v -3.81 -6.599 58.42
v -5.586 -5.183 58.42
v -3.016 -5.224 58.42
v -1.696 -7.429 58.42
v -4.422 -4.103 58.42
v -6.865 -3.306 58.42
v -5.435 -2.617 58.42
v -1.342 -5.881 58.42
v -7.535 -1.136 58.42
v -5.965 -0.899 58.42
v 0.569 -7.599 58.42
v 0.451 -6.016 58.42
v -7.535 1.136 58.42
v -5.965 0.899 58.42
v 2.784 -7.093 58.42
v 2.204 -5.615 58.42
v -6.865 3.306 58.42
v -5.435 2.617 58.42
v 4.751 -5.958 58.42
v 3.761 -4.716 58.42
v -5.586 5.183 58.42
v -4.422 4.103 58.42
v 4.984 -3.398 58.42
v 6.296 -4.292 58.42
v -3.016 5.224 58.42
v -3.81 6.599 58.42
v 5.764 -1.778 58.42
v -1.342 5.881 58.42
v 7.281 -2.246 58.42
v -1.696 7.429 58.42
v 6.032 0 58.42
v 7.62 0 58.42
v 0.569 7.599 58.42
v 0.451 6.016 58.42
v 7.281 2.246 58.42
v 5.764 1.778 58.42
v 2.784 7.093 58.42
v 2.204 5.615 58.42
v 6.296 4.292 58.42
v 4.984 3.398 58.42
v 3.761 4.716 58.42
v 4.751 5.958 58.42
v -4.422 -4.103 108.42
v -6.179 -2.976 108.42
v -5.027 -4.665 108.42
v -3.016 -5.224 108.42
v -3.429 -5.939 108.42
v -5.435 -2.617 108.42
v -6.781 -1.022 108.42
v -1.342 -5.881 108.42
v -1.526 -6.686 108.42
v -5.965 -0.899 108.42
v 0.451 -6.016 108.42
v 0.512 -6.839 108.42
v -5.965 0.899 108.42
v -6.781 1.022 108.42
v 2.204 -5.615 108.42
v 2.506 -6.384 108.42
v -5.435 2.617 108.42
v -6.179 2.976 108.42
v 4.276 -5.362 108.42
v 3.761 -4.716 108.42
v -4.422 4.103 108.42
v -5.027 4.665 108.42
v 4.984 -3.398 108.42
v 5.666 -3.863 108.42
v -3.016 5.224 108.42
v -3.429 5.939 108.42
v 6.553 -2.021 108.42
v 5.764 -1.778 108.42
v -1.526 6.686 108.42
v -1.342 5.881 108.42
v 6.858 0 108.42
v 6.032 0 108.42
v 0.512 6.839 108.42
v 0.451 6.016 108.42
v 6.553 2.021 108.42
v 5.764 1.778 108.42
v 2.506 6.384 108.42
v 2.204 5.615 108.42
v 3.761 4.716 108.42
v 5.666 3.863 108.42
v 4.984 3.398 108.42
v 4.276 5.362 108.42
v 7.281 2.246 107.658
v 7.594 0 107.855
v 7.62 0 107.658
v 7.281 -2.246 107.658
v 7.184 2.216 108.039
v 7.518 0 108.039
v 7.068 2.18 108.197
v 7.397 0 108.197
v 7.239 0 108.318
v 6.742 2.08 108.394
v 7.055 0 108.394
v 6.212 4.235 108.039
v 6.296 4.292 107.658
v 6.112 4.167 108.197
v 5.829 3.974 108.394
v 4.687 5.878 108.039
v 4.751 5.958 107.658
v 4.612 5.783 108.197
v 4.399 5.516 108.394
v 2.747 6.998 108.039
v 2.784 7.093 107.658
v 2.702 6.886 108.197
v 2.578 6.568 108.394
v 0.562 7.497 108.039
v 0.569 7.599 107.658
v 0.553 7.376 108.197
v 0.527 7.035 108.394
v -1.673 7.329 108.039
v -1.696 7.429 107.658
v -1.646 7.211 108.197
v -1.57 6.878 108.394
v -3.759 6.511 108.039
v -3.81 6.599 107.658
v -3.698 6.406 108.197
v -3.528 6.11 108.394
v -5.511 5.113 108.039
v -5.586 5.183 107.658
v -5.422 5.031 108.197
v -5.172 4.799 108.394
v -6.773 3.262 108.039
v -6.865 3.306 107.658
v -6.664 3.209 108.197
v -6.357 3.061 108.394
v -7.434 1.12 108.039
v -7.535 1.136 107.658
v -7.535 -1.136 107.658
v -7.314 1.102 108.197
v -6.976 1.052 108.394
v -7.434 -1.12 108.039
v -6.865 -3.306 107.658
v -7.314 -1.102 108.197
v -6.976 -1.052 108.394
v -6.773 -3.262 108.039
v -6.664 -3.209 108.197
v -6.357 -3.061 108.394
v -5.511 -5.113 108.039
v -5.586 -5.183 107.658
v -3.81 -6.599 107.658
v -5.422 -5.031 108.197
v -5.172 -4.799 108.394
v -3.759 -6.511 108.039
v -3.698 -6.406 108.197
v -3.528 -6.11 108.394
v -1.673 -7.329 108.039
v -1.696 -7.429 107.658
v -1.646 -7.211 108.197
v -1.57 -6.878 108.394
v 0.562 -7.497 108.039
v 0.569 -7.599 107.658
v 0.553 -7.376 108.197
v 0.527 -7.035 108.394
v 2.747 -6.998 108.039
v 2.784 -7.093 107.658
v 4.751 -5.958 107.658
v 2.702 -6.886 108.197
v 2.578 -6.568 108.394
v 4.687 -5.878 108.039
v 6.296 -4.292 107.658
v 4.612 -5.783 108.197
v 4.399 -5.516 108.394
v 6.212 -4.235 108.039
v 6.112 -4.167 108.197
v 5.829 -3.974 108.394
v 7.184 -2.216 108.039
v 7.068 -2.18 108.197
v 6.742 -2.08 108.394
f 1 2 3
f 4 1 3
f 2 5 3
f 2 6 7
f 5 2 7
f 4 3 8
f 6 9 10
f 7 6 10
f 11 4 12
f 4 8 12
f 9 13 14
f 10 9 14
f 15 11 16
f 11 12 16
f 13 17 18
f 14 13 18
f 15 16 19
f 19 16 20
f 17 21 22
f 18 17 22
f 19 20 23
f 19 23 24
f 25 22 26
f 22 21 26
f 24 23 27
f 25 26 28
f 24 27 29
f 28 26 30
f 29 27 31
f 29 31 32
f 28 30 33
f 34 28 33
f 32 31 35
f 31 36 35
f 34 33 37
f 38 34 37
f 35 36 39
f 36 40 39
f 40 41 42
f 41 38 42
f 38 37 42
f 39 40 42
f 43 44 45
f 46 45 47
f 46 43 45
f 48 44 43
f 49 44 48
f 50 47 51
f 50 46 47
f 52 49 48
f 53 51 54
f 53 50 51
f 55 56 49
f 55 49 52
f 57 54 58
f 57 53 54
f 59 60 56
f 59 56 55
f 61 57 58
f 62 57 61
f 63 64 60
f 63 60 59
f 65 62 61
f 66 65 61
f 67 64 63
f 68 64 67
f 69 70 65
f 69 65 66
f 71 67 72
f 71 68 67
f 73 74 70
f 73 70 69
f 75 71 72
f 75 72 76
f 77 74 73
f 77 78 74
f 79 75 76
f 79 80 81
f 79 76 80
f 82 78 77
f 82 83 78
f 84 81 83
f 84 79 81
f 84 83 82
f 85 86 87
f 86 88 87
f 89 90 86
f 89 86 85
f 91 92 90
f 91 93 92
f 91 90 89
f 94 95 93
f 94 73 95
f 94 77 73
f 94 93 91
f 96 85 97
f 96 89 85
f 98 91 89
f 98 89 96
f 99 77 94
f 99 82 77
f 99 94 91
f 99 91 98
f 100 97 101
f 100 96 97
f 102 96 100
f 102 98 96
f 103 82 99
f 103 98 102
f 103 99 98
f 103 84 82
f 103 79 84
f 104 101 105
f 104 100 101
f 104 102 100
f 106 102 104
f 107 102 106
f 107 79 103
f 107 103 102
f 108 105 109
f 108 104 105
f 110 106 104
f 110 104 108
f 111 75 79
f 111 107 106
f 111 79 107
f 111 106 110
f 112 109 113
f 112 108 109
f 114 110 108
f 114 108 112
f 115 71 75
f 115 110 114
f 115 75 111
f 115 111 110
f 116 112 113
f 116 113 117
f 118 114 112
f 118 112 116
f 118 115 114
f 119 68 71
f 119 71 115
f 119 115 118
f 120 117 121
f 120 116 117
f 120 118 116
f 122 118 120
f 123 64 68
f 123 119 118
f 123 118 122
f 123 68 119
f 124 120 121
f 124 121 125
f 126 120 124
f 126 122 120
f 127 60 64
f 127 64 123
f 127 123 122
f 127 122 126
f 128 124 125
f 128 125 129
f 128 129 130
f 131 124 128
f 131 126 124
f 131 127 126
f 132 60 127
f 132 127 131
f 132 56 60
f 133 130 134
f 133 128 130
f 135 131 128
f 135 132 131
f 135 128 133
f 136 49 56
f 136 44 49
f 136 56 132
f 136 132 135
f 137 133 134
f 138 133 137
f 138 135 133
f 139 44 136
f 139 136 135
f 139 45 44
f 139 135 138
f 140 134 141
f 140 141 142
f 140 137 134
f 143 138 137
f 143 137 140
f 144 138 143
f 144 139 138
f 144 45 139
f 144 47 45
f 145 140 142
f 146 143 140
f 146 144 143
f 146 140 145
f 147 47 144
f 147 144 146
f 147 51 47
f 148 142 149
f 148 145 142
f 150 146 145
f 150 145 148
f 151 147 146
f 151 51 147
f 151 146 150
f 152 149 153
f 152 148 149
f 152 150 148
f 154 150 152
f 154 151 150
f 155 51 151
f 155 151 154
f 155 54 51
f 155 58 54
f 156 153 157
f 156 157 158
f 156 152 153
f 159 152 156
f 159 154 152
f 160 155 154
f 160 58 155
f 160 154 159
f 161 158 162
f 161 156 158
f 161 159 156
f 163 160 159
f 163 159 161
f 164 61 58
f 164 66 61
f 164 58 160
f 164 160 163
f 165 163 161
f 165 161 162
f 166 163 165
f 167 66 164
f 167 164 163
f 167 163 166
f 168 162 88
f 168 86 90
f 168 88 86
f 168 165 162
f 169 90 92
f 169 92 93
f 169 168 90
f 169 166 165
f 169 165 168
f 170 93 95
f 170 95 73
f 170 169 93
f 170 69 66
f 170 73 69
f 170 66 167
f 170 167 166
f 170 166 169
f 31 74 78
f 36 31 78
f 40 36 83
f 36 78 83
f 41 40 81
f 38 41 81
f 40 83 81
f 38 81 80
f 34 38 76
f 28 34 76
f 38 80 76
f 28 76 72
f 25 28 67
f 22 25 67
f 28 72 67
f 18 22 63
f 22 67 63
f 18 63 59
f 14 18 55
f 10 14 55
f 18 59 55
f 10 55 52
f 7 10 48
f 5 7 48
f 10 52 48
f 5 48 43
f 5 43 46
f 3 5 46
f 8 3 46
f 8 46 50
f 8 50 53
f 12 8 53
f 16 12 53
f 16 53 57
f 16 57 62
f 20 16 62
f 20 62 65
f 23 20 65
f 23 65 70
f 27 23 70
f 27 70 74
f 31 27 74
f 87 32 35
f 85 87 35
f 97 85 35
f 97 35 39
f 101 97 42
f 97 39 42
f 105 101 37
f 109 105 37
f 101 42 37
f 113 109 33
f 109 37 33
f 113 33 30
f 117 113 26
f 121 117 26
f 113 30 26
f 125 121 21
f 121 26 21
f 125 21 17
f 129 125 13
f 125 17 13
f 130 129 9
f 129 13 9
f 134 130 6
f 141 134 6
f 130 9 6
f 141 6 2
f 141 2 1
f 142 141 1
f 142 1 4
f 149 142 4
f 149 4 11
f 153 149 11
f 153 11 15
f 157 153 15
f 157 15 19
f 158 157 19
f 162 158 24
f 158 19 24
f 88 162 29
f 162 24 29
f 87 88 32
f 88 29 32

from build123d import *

# Parameters (mm, degrees)
EXTRUDE1_DEPTH  = 58.42
SKETCH2_R       = 7.62
EXTRUDE2_DEPTH  = 50
SKETCH3_R       = 6.0325
EXTRUDE12_DEPTH = 110.253593305
FILLET1_R       = 0.762


with BuildPart() as part:
    # Sketch1 → Extrude1 (new body)
    with BuildSketch(Plane.XY):
        with BuildLine():
            Line((-9.525, 8.699334611), (9.525, 8.699334611))
            Line((9.525, 8.699334611), (9.525, 0))
            ThreePointArc((9.525, 0), (0, -9.525), (-9.525, 0))
            Line((-9.525, 0), (-9.525, 8.699334611))
        make_face()
    extrude(amount=EXTRUDE1_DEPTH)


with BuildPart() as body_2:
    # Sketch2 → Extrude2 (new body)
    with BuildSketch(Plane.XY.offset(58.42)):
        Circle(SKETCH2_R)
    extrude(amount=EXTRUDE2_DEPTH)


with BuildPart() as extrude12_tool:
    # Sketch3 → Extrude12 (new, through all)
    with BuildSketch(Plane.XY.offset(108.42)):
        Circle(SKETCH3_R)
    extrude(amount=-EXTRUDE12_DEPTH)


with BuildPart() as part_1:
    add(part.part)

    # Extrude12: cut by extrude12_tool
    add(extrude12_tool.part, mode=Mode.SUBTRACT)


with BuildPart() as body_2_1:
    add(body_2.part)

    # Extrude12: cut by extrude12_tool
    add(extrude12_tool.part, mode=Mode.SUBTRACT)

    # Fillet1
    fillet1_edges = [body_2_1.edges().sort_by_distance(p)[0] for p in [
        (-7.62, 0, 108.42),
    ]]
    fillet(fillet1_edges, radius=FILLET1_R)


solid = body_2_1.part
